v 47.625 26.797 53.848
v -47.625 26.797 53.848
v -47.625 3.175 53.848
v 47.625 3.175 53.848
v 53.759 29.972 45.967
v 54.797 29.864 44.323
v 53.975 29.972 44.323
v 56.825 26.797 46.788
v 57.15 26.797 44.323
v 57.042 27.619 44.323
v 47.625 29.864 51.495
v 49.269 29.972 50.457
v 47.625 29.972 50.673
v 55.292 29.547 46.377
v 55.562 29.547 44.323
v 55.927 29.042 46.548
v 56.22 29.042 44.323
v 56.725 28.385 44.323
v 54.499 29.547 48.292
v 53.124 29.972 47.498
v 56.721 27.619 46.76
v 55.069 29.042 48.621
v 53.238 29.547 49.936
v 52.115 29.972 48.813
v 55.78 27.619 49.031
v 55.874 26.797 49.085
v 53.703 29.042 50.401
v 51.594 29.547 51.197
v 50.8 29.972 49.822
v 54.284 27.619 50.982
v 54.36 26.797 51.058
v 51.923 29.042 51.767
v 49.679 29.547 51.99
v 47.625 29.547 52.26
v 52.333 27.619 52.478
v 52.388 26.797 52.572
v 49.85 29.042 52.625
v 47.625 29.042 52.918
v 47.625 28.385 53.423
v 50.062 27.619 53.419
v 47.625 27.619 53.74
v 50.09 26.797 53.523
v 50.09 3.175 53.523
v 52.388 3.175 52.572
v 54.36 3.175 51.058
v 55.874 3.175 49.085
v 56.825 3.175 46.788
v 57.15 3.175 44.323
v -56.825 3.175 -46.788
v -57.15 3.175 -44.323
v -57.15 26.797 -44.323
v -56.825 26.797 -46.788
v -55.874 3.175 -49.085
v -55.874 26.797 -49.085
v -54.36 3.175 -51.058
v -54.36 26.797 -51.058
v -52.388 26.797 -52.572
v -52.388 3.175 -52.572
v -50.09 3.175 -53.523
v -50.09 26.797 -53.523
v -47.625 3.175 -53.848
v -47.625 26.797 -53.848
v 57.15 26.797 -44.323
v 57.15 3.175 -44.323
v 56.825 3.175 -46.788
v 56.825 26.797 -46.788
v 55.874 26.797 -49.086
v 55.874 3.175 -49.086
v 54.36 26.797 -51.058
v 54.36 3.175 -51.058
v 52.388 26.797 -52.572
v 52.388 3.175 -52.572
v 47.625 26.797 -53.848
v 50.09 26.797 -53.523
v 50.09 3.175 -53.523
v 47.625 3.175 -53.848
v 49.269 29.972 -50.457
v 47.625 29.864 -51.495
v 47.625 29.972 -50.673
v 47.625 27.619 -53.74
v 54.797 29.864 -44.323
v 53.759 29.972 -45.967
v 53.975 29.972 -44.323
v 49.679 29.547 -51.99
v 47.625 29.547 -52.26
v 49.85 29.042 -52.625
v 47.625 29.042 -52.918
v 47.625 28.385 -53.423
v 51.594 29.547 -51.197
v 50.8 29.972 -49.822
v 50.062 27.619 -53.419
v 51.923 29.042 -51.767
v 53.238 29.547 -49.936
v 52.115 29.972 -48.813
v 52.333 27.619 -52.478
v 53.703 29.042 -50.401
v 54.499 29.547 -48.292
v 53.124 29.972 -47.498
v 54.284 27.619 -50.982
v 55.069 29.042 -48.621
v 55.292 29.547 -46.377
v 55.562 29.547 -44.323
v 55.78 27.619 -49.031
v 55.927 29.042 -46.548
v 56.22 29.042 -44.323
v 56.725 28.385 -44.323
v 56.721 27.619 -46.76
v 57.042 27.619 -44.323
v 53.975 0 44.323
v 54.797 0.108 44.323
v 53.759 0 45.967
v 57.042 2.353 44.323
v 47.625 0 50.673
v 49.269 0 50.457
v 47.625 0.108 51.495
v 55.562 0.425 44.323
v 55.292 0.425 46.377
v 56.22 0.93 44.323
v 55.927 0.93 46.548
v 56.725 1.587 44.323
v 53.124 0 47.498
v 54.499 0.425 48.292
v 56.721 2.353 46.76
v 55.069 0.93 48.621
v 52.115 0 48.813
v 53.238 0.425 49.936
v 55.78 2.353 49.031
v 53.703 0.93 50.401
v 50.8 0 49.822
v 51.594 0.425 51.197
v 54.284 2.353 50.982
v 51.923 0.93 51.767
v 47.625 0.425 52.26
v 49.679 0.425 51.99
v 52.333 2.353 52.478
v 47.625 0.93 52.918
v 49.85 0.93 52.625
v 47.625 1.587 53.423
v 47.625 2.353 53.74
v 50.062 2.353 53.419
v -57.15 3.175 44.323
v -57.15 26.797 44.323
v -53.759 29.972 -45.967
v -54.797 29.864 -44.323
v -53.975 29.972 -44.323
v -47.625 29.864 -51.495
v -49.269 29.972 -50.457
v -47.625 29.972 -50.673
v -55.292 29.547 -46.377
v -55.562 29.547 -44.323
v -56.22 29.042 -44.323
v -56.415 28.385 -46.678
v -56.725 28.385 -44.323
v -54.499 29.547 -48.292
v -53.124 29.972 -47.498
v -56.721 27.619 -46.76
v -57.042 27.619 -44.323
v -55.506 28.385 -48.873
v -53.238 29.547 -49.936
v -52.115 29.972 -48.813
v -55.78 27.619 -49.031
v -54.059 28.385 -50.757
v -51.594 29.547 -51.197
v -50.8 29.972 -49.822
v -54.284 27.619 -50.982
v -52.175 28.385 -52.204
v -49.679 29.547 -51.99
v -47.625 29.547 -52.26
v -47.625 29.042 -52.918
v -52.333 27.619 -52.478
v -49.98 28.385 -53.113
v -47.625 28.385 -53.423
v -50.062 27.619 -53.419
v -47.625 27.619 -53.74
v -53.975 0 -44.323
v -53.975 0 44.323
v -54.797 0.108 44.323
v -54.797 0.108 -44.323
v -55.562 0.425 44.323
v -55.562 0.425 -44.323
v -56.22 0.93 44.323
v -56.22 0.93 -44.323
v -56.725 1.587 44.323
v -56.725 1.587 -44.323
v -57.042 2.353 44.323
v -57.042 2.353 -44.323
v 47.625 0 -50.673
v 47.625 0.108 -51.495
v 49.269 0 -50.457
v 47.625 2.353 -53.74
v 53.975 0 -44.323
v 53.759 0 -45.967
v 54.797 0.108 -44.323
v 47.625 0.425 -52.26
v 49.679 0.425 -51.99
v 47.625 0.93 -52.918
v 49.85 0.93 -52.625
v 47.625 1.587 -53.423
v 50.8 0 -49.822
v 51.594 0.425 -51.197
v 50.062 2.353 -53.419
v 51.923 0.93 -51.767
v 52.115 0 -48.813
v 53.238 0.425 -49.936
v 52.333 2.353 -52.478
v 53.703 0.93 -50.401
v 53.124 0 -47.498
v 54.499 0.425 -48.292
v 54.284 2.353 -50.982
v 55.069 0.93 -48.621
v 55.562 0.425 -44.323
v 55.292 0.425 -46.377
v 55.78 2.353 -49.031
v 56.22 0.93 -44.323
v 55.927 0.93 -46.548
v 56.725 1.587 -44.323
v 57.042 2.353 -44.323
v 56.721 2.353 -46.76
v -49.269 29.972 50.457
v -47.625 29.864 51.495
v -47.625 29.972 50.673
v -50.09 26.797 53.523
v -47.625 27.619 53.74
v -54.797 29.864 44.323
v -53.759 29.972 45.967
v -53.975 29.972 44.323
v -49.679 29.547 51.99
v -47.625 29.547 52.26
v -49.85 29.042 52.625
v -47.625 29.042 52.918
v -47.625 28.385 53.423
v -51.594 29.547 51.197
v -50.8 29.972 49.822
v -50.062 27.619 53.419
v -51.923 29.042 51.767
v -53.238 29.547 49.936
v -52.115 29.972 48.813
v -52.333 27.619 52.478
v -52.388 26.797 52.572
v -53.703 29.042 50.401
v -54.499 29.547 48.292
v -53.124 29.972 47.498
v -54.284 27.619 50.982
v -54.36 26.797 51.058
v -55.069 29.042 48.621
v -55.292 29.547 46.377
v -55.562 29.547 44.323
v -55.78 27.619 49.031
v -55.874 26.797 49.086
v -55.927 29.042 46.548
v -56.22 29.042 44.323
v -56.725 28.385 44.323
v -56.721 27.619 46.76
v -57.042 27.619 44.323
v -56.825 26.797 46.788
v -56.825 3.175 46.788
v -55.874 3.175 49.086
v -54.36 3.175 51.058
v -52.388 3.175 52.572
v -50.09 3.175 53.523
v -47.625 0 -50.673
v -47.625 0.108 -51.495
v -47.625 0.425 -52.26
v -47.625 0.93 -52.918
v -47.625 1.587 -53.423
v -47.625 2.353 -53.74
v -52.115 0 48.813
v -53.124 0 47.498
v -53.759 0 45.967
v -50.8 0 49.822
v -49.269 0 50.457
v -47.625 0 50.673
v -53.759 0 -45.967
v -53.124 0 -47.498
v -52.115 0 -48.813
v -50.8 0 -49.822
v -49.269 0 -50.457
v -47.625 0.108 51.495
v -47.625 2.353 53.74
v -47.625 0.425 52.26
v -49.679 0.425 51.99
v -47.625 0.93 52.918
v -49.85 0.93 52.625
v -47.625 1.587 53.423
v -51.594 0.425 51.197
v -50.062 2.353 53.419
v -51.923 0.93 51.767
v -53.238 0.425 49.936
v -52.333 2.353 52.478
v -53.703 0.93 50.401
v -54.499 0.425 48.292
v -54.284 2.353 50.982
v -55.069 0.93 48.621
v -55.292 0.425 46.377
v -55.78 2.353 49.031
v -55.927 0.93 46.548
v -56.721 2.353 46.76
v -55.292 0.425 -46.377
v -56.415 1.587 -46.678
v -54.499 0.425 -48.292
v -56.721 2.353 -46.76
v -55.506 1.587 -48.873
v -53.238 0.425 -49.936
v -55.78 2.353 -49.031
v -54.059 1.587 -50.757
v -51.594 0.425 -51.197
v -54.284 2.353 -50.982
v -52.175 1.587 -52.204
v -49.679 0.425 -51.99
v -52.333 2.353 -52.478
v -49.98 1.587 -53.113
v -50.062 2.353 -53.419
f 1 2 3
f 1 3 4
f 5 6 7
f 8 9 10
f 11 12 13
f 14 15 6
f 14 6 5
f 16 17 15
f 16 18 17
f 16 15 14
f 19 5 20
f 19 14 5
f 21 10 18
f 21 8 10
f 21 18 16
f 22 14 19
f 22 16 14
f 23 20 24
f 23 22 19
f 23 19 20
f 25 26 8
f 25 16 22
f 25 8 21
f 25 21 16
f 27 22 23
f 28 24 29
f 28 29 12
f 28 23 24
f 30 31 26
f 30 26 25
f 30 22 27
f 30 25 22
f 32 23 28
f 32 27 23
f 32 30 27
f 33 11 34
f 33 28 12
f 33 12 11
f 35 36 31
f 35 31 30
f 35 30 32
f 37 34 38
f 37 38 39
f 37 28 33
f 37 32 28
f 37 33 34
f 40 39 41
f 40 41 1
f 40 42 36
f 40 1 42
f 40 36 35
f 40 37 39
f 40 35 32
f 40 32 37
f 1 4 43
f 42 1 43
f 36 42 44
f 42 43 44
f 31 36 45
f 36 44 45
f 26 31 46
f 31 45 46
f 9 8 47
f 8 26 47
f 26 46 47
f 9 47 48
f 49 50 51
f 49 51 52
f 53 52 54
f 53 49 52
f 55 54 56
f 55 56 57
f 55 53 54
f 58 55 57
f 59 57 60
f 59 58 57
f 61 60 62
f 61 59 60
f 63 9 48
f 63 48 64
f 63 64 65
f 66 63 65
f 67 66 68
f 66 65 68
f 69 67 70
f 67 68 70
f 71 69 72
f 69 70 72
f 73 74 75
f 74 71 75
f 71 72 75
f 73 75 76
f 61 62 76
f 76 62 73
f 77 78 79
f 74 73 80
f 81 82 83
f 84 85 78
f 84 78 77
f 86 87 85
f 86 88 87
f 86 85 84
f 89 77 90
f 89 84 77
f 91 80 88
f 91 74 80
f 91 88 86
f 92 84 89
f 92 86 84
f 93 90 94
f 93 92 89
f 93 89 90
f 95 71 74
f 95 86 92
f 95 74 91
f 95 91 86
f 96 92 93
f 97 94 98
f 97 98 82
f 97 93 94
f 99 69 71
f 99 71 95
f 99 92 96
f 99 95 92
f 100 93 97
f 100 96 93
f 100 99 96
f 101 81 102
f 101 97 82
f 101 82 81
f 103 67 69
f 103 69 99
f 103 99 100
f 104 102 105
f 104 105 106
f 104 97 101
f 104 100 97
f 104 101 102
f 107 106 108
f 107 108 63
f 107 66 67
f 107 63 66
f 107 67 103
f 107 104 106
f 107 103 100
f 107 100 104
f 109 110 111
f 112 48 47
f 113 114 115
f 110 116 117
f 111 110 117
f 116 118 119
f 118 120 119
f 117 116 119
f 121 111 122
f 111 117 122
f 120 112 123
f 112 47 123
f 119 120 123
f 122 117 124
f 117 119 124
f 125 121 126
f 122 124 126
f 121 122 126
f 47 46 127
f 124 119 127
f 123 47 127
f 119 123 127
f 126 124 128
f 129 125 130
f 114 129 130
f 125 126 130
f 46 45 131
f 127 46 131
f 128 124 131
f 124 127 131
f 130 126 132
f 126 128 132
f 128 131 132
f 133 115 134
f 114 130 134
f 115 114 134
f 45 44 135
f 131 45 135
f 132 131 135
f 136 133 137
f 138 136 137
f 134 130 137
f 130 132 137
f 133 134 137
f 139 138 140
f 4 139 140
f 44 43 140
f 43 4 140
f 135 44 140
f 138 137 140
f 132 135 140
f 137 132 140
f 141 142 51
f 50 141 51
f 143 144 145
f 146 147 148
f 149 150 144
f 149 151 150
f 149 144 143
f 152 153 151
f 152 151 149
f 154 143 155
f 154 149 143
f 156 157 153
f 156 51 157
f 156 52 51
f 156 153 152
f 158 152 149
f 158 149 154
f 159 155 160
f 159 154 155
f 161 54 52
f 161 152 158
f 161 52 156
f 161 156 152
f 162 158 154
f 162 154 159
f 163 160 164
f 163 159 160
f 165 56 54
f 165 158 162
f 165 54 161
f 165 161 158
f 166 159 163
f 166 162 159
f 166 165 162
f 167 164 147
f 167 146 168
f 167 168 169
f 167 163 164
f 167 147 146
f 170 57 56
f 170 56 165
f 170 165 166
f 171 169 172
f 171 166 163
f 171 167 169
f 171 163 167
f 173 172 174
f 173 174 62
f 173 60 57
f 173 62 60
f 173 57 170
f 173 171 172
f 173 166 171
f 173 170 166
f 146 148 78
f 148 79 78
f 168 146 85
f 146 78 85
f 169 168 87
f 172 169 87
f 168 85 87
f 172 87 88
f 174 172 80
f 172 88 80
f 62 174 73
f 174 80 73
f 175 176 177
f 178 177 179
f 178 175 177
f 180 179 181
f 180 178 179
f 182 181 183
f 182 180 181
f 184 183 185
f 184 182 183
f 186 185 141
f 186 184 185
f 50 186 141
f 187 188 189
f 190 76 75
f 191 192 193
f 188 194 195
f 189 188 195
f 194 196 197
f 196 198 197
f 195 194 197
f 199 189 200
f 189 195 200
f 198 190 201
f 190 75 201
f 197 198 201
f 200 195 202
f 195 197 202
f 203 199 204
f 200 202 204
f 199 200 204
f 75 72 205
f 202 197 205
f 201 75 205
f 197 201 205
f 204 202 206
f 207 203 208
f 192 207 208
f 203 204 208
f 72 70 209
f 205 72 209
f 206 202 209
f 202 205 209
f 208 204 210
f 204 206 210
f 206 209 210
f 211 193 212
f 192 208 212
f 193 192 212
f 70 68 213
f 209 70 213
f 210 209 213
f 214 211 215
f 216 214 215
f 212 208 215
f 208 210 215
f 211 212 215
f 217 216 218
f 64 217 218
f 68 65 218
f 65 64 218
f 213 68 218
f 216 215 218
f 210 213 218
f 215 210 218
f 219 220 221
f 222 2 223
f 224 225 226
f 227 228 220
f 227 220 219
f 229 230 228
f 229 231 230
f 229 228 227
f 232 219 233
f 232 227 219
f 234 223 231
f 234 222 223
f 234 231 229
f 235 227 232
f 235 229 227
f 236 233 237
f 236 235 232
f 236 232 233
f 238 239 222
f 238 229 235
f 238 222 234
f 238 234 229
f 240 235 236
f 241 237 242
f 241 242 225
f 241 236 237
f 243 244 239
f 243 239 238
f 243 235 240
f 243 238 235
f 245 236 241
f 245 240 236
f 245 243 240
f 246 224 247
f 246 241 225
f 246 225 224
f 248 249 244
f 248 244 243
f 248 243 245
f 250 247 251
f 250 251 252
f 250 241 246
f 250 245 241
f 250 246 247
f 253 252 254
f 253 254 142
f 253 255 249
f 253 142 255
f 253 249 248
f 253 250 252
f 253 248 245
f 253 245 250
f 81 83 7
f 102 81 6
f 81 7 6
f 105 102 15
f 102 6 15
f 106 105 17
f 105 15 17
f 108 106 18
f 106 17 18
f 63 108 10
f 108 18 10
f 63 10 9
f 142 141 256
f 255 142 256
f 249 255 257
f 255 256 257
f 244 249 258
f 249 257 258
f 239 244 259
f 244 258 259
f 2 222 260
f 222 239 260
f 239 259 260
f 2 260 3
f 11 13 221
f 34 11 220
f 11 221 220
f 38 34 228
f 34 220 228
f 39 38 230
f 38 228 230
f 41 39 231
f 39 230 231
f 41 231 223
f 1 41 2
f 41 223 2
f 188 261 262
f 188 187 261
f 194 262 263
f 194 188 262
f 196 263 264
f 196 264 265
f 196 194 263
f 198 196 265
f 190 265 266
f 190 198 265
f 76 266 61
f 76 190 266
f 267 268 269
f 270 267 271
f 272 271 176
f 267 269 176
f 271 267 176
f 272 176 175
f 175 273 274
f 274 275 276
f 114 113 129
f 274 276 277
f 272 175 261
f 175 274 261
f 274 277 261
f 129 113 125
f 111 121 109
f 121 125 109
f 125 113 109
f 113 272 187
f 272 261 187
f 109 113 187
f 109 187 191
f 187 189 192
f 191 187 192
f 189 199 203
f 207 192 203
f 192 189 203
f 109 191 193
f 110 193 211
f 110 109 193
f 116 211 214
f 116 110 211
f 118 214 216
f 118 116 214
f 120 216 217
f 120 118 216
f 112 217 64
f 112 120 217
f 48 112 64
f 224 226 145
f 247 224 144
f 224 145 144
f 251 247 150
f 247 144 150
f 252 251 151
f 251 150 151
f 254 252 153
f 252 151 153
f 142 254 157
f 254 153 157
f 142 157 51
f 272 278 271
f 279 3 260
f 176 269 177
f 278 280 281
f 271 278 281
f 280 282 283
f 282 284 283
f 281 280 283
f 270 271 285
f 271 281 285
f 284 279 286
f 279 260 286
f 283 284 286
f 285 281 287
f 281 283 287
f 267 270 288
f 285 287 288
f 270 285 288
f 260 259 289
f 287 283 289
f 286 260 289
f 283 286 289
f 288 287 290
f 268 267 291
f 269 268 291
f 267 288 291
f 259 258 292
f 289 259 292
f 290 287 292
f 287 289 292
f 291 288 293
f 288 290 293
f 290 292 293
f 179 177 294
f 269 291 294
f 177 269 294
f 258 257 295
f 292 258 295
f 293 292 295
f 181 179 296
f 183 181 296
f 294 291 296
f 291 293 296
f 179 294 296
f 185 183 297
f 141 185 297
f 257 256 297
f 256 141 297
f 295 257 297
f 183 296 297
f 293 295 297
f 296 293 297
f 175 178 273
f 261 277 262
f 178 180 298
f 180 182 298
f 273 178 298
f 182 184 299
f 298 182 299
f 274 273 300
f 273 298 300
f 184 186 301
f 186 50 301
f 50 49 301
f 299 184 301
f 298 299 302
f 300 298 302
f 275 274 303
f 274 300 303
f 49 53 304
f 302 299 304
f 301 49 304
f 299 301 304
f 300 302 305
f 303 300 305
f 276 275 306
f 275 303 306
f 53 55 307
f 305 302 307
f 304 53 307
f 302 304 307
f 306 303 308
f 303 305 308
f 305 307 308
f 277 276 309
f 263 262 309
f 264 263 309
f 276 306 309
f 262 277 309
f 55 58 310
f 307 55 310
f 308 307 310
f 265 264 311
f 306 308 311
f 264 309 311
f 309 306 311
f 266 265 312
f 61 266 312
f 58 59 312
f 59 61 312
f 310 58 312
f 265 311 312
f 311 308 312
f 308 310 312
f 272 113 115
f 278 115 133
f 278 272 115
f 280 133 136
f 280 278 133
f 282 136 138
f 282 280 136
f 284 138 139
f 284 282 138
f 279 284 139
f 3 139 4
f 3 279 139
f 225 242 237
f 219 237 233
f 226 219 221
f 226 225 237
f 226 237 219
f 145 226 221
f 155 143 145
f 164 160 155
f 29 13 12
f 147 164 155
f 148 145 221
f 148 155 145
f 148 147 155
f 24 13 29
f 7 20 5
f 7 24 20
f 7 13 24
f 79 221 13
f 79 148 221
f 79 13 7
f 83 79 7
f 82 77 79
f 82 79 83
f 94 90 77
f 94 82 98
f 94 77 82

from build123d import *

# Parameters (mm, degrees)
SKETCH1_W           = 114.3
SKETCH1_H           = 107.696
BOSS_EXTRUDE1_DEPTH = 29.972
FILLET1_R           = 9.525
FILLET2_R           = 3.175


with BuildPart() as part:
    # Sketch1 → Boss-Extrude1 (new body)
    with BuildSketch(Plane(origin=(0, 29.972, 0), x_dir=(1, 0, 0), z_dir=(0, 1, 0))):
        Rectangle(SKETCH1_W, SKETCH1_H)
    extrude(amount=-BOSS_EXTRUDE1_DEPTH)

    # Fillet1
    fillet1_edges = [part.edges().sort_by_distance(p)[0] for p in [
        (-57.15, 14.986, 53.848),
        (-57.15, 14.986, -53.848),
        (57.15, 14.986, -53.848),
        (57.15, 14.986, 53.848),
    ]]
    fillet(fillet1_edges, radius=FILLET1_R)

    # Fillet2
    fillet2_edges = [part.edges().sort_by_distance(p)[0] for p in [
        (0, 29.972, -53.848),
        (0, 0, -53.848),
        (0, 29.972, 53.848),
        (57.15, 29.972, 0),
        (-57.15, 29.972, 0),
        (54.360192091, 29.972, 51.058192091),
        (-54.360192091, 29.972, 51.058192091),
        (54.360192091, 29.972, -51.058192091),
        (-54.360192091, 29.972, -51.058192091),
        (-57.15, 0, 0),
        (0, 0, 53.848),
        (57.15, 0, 0),
        (54.360192091, 0, 51.058192091),
        (-54.360192091, 0, 51.058192091),
        (54.360192091, 0, -51.058192091),
        (-54.360192091, 0, -51.058192091),
    ]]
    fillet(fillet2_edges, radius=FILLET2_R)


solid = part.part
